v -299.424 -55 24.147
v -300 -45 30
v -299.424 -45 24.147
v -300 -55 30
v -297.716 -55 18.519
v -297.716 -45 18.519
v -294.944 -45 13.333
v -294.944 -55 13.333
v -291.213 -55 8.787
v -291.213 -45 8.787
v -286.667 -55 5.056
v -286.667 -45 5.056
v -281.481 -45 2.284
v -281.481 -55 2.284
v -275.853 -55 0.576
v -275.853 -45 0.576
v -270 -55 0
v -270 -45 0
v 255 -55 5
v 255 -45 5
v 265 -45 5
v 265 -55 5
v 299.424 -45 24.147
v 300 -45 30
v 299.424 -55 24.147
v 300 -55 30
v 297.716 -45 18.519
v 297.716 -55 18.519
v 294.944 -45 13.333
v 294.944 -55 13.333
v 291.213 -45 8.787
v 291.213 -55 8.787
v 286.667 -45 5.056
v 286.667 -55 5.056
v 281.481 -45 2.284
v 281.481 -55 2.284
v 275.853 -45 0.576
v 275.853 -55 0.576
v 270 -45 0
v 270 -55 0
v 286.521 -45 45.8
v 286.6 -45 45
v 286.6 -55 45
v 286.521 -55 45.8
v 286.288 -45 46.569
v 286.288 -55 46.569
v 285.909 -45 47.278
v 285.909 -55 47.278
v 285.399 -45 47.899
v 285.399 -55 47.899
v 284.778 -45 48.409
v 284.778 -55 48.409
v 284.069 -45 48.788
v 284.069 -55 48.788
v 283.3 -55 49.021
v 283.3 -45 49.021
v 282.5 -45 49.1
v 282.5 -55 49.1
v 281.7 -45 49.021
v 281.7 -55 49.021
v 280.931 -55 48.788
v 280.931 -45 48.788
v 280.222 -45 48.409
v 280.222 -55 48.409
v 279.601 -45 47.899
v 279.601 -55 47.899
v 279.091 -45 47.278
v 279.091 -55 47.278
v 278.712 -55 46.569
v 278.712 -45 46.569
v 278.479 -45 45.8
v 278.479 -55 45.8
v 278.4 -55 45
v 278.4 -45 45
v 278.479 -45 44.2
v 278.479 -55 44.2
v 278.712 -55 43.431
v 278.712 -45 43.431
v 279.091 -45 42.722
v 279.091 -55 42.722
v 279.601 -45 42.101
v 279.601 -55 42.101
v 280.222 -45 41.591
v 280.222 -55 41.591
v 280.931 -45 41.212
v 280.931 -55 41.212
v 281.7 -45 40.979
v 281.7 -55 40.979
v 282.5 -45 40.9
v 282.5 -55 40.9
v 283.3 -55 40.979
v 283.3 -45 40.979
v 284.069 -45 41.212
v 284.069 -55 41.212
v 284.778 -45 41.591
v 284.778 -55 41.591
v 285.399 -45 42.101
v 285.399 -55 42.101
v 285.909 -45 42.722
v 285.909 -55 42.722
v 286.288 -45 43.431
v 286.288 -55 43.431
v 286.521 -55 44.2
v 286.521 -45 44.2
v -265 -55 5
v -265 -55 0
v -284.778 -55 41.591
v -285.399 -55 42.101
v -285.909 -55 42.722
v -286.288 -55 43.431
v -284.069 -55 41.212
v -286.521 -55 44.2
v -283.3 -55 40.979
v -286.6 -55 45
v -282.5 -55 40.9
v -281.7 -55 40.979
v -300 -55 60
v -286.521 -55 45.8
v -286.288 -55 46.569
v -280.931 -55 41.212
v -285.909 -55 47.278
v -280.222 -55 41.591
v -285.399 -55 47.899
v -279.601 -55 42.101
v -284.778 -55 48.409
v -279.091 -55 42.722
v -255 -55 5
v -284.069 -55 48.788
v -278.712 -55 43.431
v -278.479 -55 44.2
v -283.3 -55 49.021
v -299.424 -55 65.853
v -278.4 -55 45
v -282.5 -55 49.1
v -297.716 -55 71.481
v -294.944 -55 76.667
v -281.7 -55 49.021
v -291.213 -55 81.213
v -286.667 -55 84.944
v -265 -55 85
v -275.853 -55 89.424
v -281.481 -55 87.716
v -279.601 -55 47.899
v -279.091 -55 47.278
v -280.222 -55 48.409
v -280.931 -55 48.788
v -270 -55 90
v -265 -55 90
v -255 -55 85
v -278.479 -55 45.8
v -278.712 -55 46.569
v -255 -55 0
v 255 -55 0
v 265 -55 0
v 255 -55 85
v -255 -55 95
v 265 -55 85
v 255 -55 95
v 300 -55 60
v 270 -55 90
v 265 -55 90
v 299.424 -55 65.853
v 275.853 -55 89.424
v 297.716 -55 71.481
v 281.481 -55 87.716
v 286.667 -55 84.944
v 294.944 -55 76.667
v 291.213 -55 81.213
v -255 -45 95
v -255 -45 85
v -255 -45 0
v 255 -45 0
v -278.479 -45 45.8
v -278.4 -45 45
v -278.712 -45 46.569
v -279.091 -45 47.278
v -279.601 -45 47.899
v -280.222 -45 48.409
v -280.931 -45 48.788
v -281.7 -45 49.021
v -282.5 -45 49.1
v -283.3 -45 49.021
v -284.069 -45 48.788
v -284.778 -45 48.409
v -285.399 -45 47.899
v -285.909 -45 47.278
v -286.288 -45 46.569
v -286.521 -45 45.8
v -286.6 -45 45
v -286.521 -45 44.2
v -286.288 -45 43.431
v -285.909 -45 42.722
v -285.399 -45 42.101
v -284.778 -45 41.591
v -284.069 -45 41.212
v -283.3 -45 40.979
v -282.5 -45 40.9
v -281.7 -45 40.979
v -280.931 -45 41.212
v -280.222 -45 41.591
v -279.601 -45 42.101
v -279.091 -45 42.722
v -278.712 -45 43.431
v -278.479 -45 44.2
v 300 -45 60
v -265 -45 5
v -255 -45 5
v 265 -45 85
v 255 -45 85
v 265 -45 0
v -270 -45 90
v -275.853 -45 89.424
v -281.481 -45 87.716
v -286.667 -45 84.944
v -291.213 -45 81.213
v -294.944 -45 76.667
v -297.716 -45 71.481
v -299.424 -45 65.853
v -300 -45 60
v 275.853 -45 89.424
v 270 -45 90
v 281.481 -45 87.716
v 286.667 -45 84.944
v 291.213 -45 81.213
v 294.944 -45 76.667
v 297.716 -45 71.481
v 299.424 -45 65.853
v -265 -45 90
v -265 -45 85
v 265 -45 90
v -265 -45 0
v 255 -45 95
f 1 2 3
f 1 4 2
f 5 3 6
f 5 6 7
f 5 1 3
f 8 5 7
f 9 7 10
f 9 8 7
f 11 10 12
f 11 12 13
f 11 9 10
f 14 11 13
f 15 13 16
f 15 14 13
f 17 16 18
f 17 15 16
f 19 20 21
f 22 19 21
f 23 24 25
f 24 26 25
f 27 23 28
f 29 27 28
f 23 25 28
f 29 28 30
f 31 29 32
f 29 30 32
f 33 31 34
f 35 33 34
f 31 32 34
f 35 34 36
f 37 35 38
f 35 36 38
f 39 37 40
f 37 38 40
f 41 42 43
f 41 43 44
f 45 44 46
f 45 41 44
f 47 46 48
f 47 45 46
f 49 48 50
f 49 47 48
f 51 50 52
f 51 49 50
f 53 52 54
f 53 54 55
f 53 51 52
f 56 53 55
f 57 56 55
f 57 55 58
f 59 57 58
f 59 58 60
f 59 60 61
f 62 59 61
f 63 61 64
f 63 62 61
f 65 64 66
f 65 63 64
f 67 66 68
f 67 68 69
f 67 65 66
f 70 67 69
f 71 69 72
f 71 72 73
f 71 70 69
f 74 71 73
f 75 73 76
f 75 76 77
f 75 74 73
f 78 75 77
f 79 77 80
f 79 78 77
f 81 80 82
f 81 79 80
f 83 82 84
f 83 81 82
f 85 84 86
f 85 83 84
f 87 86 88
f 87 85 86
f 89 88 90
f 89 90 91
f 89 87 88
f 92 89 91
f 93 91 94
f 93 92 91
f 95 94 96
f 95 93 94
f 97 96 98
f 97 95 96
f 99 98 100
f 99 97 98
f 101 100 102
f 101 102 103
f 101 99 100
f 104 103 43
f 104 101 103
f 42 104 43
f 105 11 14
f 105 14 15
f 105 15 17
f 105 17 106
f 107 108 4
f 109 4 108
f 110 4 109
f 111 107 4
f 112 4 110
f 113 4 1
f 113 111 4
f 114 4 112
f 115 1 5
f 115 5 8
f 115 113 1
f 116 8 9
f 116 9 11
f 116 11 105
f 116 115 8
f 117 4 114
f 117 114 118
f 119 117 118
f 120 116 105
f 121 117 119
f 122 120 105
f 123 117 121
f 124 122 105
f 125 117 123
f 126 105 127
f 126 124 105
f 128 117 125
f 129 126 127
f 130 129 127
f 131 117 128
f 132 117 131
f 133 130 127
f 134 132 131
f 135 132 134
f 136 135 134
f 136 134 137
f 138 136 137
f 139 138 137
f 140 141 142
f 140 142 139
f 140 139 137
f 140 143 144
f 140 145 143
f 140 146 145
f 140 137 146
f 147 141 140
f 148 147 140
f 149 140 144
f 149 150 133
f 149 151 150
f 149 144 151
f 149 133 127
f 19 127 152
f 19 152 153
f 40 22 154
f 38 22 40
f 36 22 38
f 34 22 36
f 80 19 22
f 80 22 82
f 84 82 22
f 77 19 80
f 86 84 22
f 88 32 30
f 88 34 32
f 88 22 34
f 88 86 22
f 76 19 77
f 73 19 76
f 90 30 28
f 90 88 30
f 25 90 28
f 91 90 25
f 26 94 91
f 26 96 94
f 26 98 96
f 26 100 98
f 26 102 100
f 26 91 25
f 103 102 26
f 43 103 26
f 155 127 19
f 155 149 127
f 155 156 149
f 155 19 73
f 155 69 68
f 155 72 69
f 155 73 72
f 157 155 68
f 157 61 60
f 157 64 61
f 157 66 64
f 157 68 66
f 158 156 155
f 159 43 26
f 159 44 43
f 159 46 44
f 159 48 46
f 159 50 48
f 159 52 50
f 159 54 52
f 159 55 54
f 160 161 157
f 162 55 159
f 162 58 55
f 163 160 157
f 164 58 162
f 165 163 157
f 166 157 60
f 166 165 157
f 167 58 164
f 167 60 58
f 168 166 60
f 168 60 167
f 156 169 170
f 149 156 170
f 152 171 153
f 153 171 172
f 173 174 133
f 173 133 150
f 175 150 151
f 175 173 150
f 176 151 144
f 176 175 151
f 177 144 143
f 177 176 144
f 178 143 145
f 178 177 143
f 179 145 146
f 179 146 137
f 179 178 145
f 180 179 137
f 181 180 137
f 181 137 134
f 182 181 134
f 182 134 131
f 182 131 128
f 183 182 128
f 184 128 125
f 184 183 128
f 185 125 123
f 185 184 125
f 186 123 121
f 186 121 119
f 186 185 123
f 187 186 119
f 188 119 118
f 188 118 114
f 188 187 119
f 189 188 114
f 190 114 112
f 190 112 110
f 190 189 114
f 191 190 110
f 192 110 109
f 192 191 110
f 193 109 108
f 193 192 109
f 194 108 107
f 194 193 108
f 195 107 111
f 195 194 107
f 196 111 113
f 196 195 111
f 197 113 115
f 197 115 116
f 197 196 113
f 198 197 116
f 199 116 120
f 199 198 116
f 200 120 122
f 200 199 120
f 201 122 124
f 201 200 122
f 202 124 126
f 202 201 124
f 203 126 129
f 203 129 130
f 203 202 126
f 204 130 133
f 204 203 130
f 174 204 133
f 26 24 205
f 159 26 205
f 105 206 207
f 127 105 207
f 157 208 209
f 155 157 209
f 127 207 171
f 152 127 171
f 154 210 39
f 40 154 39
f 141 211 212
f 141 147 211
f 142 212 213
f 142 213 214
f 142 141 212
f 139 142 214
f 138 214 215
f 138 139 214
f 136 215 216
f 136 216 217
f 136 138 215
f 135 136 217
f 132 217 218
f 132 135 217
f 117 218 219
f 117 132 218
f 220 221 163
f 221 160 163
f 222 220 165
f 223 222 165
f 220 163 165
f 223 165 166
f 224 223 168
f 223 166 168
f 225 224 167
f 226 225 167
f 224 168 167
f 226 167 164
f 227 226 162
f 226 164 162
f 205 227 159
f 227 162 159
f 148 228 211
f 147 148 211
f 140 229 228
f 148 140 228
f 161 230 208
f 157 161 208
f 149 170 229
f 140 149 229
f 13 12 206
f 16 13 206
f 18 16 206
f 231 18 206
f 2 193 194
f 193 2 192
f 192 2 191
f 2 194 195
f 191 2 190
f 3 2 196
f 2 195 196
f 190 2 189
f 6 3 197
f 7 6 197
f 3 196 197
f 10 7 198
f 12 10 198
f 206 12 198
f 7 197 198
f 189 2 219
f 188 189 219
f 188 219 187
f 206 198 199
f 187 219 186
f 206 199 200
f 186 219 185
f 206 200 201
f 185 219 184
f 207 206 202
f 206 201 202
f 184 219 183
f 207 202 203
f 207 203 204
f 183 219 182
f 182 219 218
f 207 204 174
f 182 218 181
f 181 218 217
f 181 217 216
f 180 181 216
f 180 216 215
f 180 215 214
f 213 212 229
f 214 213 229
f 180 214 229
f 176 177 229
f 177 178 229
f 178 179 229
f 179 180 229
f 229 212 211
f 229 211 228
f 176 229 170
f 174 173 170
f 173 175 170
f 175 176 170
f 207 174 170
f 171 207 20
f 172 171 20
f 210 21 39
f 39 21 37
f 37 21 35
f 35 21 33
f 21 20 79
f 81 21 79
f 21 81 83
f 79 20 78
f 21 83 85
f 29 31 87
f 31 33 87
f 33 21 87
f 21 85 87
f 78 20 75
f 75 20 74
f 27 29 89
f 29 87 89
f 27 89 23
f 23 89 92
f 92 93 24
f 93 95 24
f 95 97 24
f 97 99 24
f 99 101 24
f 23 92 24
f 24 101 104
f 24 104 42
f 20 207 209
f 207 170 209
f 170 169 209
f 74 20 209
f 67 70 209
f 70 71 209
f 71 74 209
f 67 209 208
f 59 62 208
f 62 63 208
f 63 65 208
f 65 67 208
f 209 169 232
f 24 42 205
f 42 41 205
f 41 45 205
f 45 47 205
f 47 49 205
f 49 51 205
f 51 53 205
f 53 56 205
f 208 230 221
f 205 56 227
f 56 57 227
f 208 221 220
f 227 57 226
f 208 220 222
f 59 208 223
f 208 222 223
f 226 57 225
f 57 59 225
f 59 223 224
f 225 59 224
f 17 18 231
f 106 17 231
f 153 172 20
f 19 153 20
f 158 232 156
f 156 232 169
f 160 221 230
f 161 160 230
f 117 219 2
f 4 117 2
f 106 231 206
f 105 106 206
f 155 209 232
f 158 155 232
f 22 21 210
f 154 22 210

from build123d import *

# Parameters (mm, degrees)
F0_R     = 4.1
F1_DEPTH = 10
F2_R     = 30
F3_ANGLE = 90


with BuildPart() as f1:
    # F0 (on Top) → F1 (new body)
    with BuildSketch(Plane.XY):
        Polygon((-265, 45), (-300, 45), (-300, -45), (-265, -45), (-265, -40), (-255, -40), (-255, -45), (255, -45), (255, -40), (265, -40), (265, -45), (300, -45), (300, 45), (265, 45), (265, 40), (255, 40), (255, 50), (-255, 50), (-255, 40), (-265, 40), align=None)
        with Locations((-282.5, 0)):
            Circle(F0_R, mode=Mode.SUBTRACT)
        with Locations((282.5, 0)):
            Circle(F0_R, mode=Mode.SUBTRACT)
    extrude(amount=F1_DEPTH)

    # F2
    f2_edges = [f1.edges().sort_by_distance(p)[0] for p in [
        (-300, -45, 5),
        (-300, 45, 5),
        (300, 45, 5),
        (300, -45, 5),
    ]]
    fillet(f2_edges, radius=F2_R)


with BuildPart() as f1_1:
    # F3: moved
    add(f1.part.rotate(Axis((282.5, -45, 0), (1, 0, 0)), F3_ANGLE))


solid = f1_1.part
